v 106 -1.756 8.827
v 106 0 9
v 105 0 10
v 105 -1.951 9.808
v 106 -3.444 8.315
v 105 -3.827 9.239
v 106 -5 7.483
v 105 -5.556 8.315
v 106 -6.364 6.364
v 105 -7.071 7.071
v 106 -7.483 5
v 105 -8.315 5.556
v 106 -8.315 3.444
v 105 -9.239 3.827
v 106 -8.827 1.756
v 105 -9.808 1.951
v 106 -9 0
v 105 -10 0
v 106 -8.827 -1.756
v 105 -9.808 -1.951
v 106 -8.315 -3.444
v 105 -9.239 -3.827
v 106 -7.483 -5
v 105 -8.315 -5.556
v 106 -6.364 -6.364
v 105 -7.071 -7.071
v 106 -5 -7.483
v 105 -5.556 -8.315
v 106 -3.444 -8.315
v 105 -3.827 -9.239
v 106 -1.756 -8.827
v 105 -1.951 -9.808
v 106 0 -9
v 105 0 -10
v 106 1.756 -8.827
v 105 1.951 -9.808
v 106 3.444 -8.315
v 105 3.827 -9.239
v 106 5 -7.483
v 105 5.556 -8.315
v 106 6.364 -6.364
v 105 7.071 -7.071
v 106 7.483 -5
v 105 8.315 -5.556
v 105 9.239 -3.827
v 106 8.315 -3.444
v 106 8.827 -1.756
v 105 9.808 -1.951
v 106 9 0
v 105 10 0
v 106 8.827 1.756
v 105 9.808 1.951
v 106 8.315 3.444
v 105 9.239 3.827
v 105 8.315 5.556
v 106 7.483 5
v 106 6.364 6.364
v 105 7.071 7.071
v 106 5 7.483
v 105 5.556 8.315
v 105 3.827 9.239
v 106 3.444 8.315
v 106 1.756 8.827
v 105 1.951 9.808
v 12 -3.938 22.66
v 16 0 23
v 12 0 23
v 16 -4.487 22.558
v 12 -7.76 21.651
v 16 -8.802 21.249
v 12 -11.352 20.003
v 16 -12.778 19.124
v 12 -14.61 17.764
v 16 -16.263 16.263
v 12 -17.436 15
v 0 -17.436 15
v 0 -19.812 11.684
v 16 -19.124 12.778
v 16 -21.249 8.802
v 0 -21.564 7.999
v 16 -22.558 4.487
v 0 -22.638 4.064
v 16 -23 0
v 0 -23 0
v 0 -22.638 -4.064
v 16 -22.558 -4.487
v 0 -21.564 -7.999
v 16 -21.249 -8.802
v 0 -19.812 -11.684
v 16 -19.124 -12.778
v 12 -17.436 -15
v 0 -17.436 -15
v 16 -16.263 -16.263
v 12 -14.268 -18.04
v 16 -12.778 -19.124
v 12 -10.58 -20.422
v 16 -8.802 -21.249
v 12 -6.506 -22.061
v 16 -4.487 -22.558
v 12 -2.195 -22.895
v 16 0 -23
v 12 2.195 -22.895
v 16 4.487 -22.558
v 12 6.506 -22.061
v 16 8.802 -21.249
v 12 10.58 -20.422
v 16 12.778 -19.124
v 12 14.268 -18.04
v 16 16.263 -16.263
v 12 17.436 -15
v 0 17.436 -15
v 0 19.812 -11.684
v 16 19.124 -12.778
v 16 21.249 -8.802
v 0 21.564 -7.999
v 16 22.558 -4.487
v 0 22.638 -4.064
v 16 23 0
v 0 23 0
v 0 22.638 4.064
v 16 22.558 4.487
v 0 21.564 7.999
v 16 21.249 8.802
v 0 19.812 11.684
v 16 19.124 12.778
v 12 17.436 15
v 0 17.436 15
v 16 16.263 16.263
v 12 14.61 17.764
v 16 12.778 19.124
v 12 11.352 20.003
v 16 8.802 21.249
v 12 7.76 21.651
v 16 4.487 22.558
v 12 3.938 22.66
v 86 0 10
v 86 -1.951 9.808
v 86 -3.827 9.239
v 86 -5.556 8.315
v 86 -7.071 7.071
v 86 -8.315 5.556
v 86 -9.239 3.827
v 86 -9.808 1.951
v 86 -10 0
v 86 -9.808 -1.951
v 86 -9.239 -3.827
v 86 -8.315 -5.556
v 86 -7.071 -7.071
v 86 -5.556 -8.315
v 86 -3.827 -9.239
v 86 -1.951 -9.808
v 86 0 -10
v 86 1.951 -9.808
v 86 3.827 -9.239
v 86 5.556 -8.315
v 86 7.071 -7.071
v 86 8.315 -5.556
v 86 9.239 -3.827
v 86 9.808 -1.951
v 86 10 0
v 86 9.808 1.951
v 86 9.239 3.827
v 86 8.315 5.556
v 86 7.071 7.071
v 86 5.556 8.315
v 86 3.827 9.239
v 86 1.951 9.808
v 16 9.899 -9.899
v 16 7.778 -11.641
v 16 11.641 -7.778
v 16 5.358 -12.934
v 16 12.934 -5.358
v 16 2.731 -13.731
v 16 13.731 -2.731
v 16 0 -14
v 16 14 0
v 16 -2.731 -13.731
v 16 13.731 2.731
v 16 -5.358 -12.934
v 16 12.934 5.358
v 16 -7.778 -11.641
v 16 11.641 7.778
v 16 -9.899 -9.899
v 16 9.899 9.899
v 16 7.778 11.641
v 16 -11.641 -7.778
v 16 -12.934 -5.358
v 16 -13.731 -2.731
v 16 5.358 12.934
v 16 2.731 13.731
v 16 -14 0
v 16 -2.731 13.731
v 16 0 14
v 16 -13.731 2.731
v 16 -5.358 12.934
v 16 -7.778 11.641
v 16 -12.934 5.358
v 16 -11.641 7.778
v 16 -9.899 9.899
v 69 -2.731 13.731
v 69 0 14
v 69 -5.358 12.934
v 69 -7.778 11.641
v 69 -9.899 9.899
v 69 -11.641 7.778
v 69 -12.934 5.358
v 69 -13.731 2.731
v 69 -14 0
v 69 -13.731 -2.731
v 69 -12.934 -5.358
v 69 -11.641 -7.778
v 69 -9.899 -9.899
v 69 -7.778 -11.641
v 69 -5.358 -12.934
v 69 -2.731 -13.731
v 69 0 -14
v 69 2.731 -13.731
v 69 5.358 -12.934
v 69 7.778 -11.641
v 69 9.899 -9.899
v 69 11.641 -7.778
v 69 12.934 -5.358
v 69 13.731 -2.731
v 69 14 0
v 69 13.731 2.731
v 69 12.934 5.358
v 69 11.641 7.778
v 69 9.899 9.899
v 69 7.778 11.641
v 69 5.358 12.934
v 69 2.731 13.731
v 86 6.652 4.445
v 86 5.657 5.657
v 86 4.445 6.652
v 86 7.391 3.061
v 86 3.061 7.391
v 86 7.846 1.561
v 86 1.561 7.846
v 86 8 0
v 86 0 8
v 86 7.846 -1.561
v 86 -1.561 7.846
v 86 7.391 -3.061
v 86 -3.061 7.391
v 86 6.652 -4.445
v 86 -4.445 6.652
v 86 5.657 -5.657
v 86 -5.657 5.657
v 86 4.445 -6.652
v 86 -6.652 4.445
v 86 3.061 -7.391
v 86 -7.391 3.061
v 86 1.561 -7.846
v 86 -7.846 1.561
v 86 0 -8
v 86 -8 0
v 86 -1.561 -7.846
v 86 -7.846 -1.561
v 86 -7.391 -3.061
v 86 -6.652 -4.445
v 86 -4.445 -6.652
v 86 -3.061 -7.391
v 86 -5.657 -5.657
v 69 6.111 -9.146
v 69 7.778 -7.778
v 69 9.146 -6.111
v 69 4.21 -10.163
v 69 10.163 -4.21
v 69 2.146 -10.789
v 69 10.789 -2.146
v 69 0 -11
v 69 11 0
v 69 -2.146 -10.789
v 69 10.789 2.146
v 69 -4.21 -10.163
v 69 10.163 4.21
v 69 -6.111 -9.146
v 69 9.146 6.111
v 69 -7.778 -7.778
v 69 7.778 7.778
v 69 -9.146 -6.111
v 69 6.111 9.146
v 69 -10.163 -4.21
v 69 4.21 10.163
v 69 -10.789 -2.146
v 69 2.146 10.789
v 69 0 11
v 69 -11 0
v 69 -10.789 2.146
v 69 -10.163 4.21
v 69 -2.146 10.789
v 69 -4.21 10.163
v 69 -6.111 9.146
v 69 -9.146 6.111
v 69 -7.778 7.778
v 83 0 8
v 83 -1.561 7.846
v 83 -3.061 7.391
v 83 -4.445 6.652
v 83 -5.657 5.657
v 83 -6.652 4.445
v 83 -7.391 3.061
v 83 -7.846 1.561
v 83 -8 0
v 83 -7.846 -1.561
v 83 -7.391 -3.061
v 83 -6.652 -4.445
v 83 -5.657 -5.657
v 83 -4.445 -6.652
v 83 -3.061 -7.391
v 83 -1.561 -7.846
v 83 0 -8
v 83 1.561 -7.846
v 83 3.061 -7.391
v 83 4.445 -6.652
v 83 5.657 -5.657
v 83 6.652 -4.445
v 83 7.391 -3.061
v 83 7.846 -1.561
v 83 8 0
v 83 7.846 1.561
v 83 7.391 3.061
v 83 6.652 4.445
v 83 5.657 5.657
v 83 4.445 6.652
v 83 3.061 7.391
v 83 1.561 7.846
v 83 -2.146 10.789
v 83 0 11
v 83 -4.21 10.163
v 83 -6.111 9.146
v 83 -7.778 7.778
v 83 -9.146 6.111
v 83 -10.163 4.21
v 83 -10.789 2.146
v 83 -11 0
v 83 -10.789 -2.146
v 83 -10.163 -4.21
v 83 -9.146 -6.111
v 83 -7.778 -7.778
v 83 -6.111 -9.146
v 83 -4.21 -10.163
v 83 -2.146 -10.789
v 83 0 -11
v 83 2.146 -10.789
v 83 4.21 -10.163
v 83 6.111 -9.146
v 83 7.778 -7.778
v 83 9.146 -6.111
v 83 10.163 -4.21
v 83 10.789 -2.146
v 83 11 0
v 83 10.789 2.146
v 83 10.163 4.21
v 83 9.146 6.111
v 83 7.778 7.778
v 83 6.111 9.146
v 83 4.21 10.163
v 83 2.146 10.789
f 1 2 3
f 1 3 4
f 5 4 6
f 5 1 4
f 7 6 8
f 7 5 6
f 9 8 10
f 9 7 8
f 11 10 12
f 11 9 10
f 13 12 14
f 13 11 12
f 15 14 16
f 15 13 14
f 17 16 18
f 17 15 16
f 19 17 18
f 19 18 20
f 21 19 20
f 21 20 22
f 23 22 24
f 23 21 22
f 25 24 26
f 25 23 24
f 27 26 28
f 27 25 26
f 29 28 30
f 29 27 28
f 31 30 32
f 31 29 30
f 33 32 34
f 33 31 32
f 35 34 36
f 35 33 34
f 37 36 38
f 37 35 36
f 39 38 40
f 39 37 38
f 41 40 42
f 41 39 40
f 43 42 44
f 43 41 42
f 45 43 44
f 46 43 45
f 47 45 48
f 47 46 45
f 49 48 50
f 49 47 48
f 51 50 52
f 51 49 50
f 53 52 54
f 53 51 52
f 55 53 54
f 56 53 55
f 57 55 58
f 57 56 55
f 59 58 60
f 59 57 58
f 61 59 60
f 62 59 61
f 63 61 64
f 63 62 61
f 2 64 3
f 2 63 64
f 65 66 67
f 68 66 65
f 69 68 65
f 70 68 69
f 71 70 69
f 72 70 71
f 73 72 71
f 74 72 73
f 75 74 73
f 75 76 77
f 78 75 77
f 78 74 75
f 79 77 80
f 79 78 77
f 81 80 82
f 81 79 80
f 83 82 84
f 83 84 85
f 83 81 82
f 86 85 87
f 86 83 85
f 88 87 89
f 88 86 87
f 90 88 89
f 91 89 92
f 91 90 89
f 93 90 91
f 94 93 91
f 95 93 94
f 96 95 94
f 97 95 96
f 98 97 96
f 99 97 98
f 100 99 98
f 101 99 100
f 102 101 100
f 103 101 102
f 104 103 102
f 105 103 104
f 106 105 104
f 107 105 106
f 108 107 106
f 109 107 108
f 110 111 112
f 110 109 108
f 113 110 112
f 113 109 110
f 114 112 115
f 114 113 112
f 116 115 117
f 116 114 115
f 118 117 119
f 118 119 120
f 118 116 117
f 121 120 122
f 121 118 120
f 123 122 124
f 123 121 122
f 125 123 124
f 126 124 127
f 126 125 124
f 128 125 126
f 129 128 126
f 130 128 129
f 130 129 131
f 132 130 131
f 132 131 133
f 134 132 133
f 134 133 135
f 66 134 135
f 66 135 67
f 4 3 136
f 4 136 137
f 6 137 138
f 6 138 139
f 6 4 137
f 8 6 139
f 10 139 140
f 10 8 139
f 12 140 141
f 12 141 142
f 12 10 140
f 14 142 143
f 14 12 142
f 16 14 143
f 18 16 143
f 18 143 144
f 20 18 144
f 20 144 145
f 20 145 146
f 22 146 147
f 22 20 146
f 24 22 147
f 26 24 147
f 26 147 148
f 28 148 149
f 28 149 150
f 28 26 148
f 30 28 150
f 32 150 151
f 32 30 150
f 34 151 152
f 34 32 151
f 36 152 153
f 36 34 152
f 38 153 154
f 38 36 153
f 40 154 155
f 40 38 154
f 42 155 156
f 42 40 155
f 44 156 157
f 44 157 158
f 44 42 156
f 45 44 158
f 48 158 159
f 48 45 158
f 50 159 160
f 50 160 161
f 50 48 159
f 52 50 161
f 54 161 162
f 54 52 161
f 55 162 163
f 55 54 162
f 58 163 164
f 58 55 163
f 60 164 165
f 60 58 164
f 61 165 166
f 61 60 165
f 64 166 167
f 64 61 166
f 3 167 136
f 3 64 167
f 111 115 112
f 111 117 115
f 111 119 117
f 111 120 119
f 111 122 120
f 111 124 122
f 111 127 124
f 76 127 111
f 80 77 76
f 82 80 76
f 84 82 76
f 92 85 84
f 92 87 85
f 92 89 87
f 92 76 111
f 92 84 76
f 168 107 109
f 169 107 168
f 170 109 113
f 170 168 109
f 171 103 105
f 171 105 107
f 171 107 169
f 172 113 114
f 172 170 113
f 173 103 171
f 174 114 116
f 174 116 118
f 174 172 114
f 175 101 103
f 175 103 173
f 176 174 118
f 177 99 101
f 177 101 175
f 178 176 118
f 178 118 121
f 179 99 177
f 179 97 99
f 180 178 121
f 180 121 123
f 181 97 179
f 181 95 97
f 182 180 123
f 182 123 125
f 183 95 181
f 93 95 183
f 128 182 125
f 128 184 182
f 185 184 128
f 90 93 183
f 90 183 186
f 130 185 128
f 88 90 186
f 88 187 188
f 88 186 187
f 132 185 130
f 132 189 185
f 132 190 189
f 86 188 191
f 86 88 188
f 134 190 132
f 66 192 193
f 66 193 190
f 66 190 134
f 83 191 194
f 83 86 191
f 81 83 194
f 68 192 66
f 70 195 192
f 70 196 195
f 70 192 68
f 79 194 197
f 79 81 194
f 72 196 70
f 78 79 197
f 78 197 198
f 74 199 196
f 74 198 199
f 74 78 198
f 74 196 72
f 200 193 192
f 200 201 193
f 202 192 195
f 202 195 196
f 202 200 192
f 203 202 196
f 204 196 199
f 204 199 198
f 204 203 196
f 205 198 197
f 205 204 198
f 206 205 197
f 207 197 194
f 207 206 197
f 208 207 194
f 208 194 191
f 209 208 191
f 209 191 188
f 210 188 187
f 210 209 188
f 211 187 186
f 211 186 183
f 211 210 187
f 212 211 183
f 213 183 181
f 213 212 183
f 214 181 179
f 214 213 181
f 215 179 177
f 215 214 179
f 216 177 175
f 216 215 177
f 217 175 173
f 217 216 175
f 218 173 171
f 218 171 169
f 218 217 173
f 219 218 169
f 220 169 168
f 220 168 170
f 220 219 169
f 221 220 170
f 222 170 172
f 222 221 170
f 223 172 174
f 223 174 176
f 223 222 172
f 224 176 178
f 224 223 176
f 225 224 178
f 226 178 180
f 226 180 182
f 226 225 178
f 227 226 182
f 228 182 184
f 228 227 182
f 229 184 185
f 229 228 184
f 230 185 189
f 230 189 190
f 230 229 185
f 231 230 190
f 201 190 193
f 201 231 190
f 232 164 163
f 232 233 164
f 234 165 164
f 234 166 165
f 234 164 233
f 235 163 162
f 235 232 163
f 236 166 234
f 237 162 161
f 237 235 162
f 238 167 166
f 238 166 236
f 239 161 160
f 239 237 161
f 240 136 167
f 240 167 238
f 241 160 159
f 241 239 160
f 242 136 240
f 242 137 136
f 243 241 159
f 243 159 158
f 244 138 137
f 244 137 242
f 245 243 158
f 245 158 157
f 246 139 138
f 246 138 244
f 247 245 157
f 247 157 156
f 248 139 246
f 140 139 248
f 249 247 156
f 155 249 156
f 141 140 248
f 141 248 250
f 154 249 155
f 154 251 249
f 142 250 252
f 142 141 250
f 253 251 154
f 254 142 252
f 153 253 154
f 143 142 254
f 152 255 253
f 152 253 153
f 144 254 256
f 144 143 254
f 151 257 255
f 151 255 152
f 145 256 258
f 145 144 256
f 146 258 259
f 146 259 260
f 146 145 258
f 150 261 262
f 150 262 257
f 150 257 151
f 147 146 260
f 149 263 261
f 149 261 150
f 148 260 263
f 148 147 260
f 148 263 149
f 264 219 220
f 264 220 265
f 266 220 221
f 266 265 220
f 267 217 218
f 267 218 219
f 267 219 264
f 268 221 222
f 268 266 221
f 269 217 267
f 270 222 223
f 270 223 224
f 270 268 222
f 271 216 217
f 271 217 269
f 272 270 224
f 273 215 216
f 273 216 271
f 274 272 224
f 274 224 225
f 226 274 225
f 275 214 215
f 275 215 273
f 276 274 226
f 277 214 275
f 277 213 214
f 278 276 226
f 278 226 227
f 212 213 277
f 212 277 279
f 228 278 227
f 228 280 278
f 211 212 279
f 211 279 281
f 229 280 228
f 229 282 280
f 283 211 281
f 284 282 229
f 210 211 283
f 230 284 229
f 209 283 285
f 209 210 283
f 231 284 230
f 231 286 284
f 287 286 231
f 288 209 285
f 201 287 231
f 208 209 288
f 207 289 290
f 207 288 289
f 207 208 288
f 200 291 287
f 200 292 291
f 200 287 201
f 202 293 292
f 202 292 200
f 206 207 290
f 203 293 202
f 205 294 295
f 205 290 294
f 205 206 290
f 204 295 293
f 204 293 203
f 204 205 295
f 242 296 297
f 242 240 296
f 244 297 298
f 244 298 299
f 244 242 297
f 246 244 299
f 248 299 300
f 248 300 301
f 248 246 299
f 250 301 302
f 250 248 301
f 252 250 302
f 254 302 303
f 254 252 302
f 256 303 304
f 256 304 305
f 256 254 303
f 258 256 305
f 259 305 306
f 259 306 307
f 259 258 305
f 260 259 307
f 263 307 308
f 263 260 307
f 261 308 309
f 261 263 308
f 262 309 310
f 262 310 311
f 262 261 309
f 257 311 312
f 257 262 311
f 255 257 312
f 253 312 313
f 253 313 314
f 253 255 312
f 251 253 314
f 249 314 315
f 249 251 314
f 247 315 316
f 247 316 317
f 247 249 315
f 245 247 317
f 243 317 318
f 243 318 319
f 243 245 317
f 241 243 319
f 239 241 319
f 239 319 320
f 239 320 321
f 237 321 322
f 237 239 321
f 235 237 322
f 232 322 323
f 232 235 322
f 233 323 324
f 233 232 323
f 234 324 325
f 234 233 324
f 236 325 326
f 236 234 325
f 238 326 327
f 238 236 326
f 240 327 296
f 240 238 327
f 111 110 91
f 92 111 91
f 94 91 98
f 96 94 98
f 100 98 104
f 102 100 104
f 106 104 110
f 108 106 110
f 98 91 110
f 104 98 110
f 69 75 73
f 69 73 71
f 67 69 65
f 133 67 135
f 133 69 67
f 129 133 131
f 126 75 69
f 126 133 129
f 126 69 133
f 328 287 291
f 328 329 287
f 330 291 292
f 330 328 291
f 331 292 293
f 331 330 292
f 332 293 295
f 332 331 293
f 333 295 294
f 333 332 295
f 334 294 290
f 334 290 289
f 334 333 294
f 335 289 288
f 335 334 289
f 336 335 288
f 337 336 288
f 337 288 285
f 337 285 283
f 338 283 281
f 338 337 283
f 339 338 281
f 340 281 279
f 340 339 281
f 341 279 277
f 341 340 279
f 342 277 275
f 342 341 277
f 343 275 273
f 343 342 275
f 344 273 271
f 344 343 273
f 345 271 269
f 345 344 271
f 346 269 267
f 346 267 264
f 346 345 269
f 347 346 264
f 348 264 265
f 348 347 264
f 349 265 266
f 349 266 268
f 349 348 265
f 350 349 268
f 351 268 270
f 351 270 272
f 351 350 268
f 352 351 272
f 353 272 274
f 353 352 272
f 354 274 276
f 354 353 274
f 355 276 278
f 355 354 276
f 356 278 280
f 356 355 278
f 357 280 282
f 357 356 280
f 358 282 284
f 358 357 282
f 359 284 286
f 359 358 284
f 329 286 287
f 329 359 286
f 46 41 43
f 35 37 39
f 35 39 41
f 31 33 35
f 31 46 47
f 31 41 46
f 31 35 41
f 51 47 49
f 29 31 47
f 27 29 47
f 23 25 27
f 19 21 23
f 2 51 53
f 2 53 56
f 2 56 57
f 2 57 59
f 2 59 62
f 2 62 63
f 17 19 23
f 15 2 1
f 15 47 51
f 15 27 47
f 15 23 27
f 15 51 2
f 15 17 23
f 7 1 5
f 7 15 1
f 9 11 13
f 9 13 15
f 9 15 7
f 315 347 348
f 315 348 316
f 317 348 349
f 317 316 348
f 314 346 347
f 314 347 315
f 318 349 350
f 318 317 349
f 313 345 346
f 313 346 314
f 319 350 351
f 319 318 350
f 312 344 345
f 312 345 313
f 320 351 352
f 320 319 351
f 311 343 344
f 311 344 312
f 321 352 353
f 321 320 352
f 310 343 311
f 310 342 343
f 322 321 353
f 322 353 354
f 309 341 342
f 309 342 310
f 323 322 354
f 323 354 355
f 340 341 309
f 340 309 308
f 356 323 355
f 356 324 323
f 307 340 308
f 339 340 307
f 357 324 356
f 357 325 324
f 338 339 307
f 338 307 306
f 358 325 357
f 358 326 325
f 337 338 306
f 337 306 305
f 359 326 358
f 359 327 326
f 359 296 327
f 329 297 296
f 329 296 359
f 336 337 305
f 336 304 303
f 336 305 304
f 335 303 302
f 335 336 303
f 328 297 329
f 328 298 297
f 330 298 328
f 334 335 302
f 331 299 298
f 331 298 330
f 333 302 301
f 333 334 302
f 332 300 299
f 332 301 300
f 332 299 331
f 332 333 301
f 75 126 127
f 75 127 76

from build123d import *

# Parameters (mm, degrees)
CHAMFER1_SIZE      = 1
CUT_EXTRUDE1_START = -12
CUT_EXTRUDE1_DEPTH = 12


with BuildPart() as part:
    # Sketch1 → Revolve1 (revolve)
    with BuildSketch(Plane.XY):
        Polygon((0, 0), (0, 23), (16, 23), (16, 14), (69, 14), (69, 11), (83, 11), (83, 8), (86, 8), (86, 10), (106, 10), (106, 0), align=None)
    revolve(axis=Axis((0, 0, 0), (1, 0, 0)))

    # Chamfer1
    chamfer1_edges = [part.edges().sort_by_distance(p)[0] for p in [
        (106, -10, 0),
    ]]
    chamfer(chamfer1_edges, length=CHAMFER1_SIZE)

    # Sketch2 → Cut-Extrude1 (cut)
    with BuildSketch(Plane.ZY.offset(CUT_EXTRUDE1_START)):
        with BuildLine():
            Line((-15, 17.435595774), (-15, -17.435595774))
            ThreePointArc((-15, -17.435595774), (-23, 0), (-15, 17.435595774))
        make_face()
        with BuildLine():
            Line((15, 17.435595774), (15, -17.435595774))
            ThreePointArc((15, -17.435595774), (23, 0), (15, 17.435595774))
        make_face()
    extrude(amount=CUT_EXTRUDE1_DEPTH, mode=Mode.SUBTRACT)


solid = part.part
